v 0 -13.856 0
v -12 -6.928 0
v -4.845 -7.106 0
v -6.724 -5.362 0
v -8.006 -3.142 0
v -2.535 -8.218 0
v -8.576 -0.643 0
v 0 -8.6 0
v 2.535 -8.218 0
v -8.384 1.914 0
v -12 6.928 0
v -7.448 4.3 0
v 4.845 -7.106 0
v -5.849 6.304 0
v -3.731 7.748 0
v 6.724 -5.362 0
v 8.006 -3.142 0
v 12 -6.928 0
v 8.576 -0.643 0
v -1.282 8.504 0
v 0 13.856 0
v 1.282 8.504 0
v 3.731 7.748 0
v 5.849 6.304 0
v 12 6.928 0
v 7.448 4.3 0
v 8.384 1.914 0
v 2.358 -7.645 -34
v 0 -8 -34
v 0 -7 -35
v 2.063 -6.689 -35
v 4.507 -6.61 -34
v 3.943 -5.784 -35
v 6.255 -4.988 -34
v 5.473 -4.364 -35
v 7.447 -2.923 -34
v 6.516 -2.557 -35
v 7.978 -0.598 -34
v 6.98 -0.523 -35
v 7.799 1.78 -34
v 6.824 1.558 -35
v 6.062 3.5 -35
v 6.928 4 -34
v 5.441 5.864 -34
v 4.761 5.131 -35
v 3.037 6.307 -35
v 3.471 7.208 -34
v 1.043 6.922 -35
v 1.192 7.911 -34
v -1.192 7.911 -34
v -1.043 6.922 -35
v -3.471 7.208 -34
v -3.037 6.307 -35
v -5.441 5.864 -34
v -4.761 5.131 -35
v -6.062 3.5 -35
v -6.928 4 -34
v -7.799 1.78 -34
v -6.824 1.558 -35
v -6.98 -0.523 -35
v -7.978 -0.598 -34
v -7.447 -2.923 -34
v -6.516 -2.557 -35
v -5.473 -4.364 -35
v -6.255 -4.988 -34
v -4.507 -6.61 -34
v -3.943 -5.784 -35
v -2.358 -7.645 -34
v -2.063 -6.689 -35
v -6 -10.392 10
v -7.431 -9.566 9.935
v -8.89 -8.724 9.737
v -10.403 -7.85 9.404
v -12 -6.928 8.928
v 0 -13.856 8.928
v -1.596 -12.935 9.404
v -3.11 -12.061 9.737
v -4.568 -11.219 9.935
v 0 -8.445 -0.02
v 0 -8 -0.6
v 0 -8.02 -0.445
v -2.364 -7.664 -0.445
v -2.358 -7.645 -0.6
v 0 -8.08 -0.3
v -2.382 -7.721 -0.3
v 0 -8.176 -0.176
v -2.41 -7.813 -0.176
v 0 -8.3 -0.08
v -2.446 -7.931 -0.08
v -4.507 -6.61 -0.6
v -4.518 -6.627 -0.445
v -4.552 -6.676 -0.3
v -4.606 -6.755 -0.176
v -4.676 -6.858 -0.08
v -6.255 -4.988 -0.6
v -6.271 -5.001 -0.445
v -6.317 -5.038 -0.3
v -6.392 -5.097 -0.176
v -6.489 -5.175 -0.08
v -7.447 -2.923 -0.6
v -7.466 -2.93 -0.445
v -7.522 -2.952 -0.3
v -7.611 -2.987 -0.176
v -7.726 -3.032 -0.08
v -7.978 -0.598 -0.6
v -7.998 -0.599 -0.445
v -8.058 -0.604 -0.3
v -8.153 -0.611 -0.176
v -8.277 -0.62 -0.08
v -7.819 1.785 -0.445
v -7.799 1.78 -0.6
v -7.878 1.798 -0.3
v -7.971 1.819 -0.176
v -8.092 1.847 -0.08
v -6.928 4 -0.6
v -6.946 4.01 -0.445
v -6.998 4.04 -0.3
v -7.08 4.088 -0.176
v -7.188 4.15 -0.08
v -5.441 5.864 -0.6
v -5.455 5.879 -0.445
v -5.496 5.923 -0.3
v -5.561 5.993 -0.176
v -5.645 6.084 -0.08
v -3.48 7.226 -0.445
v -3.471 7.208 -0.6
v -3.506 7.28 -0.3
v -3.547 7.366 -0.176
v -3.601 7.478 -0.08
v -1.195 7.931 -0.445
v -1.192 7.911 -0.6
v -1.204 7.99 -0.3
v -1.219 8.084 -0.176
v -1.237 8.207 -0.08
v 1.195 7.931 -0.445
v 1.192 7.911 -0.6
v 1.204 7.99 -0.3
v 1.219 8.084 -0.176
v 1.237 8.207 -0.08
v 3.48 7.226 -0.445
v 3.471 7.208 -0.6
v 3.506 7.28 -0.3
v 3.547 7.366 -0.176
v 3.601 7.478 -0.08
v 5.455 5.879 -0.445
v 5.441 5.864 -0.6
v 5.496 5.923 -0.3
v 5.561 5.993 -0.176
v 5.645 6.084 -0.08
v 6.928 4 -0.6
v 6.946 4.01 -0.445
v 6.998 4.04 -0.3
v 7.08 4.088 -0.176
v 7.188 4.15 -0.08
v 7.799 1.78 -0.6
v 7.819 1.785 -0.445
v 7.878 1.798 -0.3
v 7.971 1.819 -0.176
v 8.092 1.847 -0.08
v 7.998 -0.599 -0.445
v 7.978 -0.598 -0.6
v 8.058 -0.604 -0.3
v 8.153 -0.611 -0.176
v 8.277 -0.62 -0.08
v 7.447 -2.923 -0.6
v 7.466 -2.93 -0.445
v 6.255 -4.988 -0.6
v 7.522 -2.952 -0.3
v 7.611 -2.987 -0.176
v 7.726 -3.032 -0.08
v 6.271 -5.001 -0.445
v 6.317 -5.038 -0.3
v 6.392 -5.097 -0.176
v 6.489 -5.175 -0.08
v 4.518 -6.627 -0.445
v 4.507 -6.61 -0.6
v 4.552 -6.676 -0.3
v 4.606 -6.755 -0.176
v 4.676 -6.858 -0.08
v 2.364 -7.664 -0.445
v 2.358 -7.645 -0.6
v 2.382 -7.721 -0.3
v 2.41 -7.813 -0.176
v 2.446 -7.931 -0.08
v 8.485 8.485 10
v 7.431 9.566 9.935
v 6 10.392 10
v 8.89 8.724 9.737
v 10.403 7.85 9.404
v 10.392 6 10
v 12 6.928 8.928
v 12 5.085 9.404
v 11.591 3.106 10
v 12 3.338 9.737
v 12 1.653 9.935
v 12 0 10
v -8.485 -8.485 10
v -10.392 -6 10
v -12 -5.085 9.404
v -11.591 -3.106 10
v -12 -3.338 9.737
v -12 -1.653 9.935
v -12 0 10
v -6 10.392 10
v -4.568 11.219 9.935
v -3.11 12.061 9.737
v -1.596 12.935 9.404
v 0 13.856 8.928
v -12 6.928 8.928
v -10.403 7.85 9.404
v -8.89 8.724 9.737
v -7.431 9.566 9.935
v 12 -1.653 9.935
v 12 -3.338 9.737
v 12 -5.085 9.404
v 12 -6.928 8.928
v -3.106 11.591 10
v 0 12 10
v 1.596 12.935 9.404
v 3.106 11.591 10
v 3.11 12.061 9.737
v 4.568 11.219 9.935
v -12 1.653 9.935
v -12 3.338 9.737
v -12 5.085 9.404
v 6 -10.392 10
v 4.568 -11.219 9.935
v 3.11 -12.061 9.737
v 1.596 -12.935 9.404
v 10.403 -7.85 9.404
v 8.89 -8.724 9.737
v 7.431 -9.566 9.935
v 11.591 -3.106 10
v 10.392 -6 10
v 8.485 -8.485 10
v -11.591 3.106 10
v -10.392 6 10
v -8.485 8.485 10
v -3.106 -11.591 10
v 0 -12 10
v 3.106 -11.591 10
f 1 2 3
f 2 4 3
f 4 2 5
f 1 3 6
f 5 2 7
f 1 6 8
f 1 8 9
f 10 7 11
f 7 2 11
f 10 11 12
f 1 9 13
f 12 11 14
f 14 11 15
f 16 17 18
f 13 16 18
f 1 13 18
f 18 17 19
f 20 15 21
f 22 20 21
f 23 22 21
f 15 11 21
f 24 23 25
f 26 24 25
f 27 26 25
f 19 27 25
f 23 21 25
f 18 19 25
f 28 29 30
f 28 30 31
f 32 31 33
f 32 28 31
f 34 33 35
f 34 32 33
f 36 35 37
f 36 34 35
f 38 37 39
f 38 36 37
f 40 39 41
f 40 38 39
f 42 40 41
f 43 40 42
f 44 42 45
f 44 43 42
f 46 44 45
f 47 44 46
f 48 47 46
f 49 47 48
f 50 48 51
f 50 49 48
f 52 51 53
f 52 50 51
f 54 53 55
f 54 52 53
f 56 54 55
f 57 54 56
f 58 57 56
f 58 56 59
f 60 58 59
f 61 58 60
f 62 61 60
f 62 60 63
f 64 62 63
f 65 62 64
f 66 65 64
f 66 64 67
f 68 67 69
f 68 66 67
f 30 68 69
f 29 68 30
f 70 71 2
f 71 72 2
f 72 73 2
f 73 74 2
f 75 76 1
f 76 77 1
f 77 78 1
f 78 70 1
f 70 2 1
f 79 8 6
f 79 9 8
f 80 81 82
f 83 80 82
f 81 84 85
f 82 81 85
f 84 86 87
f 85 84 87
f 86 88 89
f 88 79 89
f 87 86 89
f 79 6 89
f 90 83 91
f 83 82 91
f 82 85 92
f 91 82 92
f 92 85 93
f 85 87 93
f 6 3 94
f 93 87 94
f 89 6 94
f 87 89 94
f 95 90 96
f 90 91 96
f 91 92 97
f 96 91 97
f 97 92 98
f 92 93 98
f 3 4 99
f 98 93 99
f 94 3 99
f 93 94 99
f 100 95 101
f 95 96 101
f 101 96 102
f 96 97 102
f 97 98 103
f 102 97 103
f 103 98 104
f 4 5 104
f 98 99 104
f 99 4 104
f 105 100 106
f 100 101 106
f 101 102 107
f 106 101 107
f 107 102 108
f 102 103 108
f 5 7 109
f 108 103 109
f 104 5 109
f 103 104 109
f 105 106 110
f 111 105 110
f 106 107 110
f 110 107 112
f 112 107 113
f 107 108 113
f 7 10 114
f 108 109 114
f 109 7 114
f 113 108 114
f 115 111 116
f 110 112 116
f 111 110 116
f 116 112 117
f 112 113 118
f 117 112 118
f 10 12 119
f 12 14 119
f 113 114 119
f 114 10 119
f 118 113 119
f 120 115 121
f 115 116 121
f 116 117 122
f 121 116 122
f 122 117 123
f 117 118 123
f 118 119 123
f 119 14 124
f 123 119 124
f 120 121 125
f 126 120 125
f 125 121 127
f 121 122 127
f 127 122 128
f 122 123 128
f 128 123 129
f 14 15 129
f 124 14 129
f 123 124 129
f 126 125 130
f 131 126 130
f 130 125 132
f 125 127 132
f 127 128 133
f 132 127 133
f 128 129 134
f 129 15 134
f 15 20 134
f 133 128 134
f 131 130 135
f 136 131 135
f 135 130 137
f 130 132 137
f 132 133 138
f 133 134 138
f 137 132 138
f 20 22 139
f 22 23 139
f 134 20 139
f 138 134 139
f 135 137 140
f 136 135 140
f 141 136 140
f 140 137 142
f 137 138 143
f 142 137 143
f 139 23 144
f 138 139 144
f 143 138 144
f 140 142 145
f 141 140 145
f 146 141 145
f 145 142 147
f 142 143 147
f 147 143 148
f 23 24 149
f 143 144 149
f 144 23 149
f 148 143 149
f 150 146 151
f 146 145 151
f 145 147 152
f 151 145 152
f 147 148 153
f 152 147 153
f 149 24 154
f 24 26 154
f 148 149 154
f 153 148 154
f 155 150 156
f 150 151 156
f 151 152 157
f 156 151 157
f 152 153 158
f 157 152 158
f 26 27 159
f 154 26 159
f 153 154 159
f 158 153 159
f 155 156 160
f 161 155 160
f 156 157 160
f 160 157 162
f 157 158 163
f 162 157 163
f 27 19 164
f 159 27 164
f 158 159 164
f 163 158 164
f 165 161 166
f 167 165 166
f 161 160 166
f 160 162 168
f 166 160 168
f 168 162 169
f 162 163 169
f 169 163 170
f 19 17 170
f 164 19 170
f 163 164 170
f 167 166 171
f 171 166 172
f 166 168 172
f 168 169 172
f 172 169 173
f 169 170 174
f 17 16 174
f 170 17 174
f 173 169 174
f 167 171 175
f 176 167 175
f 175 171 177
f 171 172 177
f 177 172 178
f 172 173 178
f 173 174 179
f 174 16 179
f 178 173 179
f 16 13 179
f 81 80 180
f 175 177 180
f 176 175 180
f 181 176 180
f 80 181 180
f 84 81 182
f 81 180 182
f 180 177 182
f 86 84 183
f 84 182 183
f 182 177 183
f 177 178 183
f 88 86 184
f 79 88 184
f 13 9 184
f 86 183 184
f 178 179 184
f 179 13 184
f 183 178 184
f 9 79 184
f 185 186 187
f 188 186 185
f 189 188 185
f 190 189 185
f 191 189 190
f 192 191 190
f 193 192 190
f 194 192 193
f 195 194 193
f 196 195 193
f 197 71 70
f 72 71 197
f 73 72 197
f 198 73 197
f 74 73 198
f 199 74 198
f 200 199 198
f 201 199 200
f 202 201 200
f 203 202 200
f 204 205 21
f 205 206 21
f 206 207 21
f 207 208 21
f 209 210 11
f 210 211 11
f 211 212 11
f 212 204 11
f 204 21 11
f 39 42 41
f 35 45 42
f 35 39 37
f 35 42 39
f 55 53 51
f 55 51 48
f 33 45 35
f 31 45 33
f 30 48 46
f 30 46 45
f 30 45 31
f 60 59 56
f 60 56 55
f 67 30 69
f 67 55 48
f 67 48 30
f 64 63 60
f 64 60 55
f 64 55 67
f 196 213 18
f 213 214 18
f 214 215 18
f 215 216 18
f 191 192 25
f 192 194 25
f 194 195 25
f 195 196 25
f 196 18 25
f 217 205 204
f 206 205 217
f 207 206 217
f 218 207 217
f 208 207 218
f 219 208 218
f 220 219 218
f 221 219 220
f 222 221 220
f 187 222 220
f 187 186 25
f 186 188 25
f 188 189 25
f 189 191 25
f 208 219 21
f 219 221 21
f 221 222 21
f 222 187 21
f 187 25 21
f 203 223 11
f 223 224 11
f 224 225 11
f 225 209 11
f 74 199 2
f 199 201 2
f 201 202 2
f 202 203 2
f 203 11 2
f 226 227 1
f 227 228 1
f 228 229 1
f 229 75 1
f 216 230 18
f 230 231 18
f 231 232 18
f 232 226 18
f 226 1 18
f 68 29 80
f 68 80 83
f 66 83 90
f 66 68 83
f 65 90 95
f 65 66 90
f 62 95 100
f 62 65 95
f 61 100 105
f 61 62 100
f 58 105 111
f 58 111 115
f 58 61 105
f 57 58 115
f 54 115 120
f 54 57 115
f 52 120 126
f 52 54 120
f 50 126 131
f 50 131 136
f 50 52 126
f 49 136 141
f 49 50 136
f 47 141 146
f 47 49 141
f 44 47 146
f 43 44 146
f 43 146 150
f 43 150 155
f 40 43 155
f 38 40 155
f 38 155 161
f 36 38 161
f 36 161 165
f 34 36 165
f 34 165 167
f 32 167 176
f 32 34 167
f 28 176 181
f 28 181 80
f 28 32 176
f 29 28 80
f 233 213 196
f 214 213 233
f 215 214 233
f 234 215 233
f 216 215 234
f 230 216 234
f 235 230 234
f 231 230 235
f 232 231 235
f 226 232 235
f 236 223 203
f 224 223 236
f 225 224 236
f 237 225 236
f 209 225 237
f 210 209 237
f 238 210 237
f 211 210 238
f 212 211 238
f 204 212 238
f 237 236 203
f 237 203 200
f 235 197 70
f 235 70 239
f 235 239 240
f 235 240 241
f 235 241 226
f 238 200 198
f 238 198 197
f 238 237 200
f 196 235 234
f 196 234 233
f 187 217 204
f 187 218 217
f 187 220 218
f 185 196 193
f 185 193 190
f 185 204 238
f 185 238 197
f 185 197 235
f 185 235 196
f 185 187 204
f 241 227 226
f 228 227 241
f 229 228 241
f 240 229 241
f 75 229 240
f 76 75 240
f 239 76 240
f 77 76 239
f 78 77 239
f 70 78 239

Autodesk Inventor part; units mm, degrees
ref_plane "WorkPlane1" through (0, 0, 0) normal (0, 0, 1) x (1, 0, 0)
sketch "Sketch1" plane through (0, 0, 0) normal (0, 0, 1) x (1, 0, 0)
  point P0 (0, 0)
sketch "Sketch2" plane through (0, 0, 0) normal (0, 0, 1) x (1, 0, 0)
  line L0 (-12, 6.9284) -> (-12, -6.9284)
  line L1 (0, 13.8562) -> (-12, 6.9284)
  line L2 (12, 6.9284) -> (0, 13.8562)
  line L3 (12, -6.9284) -> (12, 6.9284)
  line L4 (0, -13.8562) -> (12, -6.9284)
  line L5 (-12, -6.9284) -> (0, -13.8562)
  circle A0 centre (0, 0) radius 12 construction
  dimension "d1" = 24
  dimension "d29" = 0
  dimension "d30" = 0
extrude "Extrusion1" add sketch "Sketch2" along normal blind 10
sketch "Sketch3" plane through (0, 0, 0) normal (1, 0, 0) x (0, 1, 0)
  line L0 (12, 10) -> (13.9562, 10)
  line L1 (13.9562, 8.8706) -> (12, 10)
  line L2 (13.9562, 10) -> (13.9562, 8.8706)
  line L3 (0, -2) -> (0, 12) projected
  line L4 (13.8562, 0) -> (13.8562, 10) projected
  dimension "d25" = 0.1
  dimension "d26" = 0
  dimension "d27" = 60
  dimension "d28" = 12
revolve "Revolution1" cut sketch "Sketch3" angle 360 about axis through (0, 0, -10) along (0, 0, 1)
sketch "Sketch4" plane through (0, 0, 0) normal (1, 0, 0) x (0, 1, 0)
  line L0 (0, -35) -> (0, 0)
  line L1 (-8, -35) -> (0, -35)
  line L2 (-8, 0) -> (-8, -35)
  line L3 (0, 0) -> (-8, 0)
  line L4 (0, -35) -> (0, 0)
  line L5 (-9.6, 0) -> (1.6, 0) projected
  line L6 (0, -42) -> (0, 7) projected
  dimension "d18" = 8
  dimension "d20" = 35
  dimension "d33" = 0
  dimension "d34" = 0
revolve "Revolution2" add sketch "Sketch4" angle 360 about axis through (0, 0, -35) along (0, 0, -1)
chamfer "Chamfer1" distance 1 angle 45 1 edges at (0, 8, -35)
fillet "Fillet1" radius 0.6 1 edges at (0, 8, 0)
thread "Thread1" size "M16x2" class "6g" standard "ISO Metric profile" length 31
ref_plane "MSC_PF1" through (0, 0, 0) normal (1, 0, 0) x (0, 1, 0)
ref_plane "MSC_PT1" through (0, 0, 0) normal (0, 0, -1) x (-1, 0, 0)
equation "\"d22\" = 0.5 * PTC"
equation "\"d23\" = 0.5 * PTC"
equation "\"d24\" = r"
equation "\"d1\" = ParS"
equation "\"d6\" = ParK"
equation "\"b\" = NLG - 2 * PTC"
equation "\"d28\" = 0.5 * ParS"
equation "\"d18\" = 0.5 * NND"
equation "\"d20\" = NLG"
equation "\"NND\" = 16"
equation "\"NLG\" = 35"
equation "\"PTC\" = 2"
equation "\"ParK\" = 10"
equation "\"ParS\" = 24"
equation "\"msp_es\" = 0.577367 * ParS"
equation "\"r\" = 0.6"
equation "\"THREADDIA\" = NND"
properties part number "ISO 4018 - M16 x 35" material "Steel"
